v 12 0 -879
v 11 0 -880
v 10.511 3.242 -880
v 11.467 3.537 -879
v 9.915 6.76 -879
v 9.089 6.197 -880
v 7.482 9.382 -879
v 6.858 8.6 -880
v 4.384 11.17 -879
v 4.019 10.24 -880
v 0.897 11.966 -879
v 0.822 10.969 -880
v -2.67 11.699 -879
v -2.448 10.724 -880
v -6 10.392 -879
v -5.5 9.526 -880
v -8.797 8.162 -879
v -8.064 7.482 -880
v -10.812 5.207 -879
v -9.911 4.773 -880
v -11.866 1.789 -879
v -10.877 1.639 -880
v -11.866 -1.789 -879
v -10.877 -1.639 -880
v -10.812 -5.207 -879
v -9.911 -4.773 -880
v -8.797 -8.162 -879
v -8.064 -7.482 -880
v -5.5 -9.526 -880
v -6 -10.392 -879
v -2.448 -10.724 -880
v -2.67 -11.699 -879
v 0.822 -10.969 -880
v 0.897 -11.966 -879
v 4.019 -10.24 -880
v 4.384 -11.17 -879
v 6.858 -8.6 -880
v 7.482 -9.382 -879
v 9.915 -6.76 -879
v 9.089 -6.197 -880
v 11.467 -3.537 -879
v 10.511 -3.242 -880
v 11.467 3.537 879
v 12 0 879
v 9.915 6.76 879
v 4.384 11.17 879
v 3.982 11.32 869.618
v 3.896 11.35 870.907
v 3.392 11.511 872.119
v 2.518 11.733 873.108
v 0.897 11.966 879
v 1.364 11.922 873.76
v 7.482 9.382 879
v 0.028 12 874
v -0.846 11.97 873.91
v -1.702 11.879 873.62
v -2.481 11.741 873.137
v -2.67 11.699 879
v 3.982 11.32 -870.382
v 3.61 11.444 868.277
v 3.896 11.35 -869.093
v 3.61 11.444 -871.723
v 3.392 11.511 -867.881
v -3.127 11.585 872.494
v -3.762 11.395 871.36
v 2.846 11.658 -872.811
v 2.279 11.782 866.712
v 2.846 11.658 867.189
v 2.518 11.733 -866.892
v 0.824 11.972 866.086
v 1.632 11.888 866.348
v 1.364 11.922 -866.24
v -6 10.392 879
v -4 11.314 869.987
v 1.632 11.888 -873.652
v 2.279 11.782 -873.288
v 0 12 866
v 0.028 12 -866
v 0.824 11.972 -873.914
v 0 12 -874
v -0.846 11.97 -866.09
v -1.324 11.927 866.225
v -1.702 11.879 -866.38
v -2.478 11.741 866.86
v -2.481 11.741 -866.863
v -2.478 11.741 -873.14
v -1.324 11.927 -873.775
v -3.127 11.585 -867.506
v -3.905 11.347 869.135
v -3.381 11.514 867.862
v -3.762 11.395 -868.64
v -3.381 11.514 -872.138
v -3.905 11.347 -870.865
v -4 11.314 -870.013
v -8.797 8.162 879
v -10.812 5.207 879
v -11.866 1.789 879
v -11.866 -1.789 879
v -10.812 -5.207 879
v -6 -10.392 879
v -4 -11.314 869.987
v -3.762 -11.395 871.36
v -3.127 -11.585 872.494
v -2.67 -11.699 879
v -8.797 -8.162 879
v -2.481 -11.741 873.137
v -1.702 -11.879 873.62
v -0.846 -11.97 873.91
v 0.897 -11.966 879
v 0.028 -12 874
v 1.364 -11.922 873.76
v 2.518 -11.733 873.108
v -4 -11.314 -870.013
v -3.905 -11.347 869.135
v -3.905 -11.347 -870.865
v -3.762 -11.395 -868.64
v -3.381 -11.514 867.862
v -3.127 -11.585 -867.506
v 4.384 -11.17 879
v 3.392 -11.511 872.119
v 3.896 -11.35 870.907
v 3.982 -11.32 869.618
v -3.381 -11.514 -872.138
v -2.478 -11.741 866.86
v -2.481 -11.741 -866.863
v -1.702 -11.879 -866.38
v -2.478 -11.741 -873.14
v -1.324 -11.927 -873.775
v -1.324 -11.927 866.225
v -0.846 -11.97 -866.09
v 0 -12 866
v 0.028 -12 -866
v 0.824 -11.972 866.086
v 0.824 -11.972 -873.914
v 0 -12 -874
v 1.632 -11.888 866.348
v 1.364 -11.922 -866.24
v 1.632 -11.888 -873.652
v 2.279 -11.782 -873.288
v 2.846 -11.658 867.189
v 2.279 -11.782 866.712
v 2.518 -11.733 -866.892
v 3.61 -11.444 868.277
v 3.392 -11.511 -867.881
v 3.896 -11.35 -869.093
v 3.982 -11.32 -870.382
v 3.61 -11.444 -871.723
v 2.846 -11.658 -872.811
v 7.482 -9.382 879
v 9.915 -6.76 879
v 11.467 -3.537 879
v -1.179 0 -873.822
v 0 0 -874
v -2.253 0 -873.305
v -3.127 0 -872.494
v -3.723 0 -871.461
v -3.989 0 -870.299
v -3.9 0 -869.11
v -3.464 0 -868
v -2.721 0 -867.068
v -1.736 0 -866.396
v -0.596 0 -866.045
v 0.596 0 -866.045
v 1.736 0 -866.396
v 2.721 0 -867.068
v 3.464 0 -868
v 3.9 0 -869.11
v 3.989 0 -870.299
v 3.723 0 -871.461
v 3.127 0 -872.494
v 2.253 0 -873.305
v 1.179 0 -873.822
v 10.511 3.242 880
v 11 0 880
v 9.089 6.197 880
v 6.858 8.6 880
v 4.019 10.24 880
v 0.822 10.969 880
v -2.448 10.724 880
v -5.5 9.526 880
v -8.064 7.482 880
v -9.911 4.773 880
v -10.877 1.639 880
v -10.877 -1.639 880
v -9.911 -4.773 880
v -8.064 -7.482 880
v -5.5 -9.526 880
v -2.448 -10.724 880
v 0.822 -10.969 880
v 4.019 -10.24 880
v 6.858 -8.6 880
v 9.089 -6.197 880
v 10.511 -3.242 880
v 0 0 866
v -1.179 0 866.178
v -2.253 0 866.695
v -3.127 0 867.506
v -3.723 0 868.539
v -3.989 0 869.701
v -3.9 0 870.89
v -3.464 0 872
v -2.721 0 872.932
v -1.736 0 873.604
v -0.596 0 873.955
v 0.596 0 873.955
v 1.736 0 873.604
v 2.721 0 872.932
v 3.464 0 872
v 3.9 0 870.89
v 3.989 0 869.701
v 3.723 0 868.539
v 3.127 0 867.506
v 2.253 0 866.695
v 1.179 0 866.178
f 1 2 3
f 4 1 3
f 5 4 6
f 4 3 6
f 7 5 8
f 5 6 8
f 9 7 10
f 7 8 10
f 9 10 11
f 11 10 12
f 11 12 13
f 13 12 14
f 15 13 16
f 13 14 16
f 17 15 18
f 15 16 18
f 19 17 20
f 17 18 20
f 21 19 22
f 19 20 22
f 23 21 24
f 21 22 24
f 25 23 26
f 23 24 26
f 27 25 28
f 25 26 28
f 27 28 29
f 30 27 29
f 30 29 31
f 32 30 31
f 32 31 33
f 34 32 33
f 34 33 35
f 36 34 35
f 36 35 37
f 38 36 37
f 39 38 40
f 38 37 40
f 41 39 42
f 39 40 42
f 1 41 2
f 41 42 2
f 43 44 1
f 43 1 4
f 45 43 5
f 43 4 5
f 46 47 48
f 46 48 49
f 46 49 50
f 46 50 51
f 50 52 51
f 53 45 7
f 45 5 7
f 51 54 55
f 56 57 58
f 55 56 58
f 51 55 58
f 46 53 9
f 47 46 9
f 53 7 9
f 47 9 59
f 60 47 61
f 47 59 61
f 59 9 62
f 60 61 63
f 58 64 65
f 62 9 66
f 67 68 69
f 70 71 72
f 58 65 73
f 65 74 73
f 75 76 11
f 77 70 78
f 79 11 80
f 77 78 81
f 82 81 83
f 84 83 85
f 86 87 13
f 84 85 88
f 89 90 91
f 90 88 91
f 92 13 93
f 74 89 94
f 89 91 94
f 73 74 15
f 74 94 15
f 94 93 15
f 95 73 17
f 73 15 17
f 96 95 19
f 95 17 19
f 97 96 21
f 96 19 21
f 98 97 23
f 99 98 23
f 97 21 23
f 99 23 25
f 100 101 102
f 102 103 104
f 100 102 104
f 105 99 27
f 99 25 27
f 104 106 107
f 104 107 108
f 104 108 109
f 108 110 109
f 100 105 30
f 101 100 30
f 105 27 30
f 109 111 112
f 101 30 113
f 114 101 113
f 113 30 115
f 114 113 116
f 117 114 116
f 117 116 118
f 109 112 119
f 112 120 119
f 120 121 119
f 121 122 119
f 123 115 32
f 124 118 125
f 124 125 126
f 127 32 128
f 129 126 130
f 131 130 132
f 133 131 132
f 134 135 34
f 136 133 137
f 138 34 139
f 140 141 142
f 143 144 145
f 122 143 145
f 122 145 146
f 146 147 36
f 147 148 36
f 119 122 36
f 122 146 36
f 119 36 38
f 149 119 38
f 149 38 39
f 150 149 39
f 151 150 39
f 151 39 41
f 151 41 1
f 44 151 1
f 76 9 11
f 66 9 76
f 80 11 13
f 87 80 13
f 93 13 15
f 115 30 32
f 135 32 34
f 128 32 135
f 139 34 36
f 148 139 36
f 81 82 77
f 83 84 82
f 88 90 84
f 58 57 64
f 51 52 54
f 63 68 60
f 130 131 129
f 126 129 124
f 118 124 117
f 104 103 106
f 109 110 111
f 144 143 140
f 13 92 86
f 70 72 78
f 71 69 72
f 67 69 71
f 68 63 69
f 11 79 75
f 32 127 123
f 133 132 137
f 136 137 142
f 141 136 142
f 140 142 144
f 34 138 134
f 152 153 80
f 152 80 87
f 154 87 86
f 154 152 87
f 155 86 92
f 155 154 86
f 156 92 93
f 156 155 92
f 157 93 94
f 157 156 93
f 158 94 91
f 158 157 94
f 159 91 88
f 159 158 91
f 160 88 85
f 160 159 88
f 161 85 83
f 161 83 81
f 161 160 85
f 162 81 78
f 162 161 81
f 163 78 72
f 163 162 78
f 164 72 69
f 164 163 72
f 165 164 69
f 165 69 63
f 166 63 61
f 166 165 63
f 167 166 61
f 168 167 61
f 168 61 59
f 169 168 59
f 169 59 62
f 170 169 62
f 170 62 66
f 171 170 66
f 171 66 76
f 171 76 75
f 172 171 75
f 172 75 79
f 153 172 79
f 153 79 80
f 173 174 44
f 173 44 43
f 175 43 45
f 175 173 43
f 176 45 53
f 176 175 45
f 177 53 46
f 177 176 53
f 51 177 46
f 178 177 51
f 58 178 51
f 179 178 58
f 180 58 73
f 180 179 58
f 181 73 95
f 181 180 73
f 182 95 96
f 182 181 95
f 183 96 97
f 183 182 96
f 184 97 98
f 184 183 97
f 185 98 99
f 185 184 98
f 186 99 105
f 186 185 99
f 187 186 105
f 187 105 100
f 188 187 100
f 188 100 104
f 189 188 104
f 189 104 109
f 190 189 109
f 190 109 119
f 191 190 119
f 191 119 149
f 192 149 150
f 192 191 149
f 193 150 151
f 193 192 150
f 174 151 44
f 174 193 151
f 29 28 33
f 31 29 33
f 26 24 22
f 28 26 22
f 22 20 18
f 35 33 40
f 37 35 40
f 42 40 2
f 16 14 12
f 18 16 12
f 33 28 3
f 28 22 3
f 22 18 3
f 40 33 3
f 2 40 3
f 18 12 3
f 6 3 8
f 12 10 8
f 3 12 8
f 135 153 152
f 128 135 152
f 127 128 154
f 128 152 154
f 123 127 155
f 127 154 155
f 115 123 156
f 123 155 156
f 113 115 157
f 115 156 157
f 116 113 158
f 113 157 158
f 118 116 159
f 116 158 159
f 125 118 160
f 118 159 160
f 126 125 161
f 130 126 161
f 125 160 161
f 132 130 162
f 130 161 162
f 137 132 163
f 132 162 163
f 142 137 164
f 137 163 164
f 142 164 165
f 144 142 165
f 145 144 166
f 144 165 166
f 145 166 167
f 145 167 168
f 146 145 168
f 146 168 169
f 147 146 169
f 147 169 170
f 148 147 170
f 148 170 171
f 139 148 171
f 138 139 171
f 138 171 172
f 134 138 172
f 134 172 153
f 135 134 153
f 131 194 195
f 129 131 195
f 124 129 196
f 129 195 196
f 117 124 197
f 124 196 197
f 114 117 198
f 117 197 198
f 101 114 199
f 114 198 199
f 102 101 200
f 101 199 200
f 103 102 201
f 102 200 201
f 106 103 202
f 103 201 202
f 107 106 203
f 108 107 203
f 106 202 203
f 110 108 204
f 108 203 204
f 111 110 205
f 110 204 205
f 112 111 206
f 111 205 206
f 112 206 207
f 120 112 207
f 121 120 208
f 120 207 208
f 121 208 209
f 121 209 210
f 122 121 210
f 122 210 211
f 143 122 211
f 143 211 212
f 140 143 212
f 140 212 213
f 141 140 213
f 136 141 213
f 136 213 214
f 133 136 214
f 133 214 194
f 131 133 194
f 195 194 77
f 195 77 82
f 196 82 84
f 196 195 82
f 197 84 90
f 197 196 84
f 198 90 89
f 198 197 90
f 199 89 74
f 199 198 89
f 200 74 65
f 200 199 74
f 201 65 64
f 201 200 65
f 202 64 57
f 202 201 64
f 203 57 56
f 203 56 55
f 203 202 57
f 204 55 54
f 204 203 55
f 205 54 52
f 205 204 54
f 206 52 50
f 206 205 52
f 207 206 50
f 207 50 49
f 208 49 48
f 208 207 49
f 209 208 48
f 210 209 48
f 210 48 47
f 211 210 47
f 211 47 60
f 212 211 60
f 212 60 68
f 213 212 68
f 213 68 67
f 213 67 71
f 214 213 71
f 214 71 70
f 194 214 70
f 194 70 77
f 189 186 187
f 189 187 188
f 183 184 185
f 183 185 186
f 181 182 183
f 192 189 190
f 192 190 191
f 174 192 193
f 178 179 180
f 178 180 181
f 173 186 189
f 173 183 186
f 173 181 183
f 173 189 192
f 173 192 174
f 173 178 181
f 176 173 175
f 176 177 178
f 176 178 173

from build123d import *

# Parameters (mm, degrees)
DODANIE_WYCI_GNI_CIE1_DEPTH                 = 880
DODANIE_WYCI_GNI_CIE1_DEPTH_BACK            = 880
SZKIC1_R                                    = 12
WYTNIJ_WYCI_GNI_CIE1_REACH                  = 882.164
WYTNIJ_WYCI_GNI_CIE1_END_RADIUS             = 12
SZKIC2_R                                    = 4
WYTNIJ_WYCI_GNI_CIE1_DIRECTION_2_REACH      = 882.164
WYTNIJ_WYCI_GNI_CIE1_DIRECTION_2_END_RADIUS = 12
SFAZOWANIE1_SIZE                            = 1


with BuildPart() as part:
    # Szkic1 → Dodanie-wyciągnięcie1 (new, two sides: drawn at the far end of the back side and taken through both)
    with BuildSketch(Plane.XY.offset(-DODANIE_WYCI_GNI_CIE1_DEPTH_BACK)):
        Circle(SZKIC1_R)
    extrude(amount=DODANIE_WYCI_GNI_CIE1_DEPTH + DODANIE_WYCI_GNI_CIE1_DEPTH_BACK)

    # Wytnij-wyciągnięcie1: up to this cylinder (the profile starts inside it)
    wytnij_wyci_gni_cie1_end = Plane(origin=(0, 0, 0), z_dir=(0, 0, 1)) * Cylinder(WYTNIJ_WYCI_GNI_CIE1_END_RADIUS, 3529.328, mode=Mode.PRIVATE)
    # Szkic2 → Wytnij-wyciągnięcie1 (cut, up to the surface)
    with BuildSketch(Plane(origin=(0, 0, 0), x_dir=(1, 0, 0), z_dir=(0, 1, 0)), mode=Mode.PRIVATE) as wytnij_wyci_gni_cie1_sk1:
        with Locations(Location((0, 870, 0), (0, 0, 90))):
            Circle(SZKIC2_R)
    wytnij_wyci_gni_cie1_tool1 = extrude(wytnij_wyci_gni_cie1_sk1.sketch, amount=-WYTNIJ_WYCI_GNI_CIE1_REACH, mode=Mode.PRIVATE) & wytnij_wyci_gni_cie1_end
    add(wytnij_wyci_gni_cie1_tool1.solids().sort_by_distance((0, 0, -870))[0], mode=Mode.SUBTRACT)
    # Szkic2 → Wytnij-wyciągnięcie1 (cut, up to the surface)
    with BuildSketch(Plane(origin=(0, 0, 0), x_dir=(1, 0, 0), z_dir=(0, 1, 0)), mode=Mode.PRIVATE) as wytnij_wyci_gni_cie1_sk2:
        with Locations(Location((0, -870, 0), (0, 0, 90))):
            Circle(SZKIC2_R)
    wytnij_wyci_gni_cie1_tool2 = extrude(wytnij_wyci_gni_cie1_sk2.sketch, amount=-WYTNIJ_WYCI_GNI_CIE1_REACH, mode=Mode.PRIVATE) & wytnij_wyci_gni_cie1_end
    add(wytnij_wyci_gni_cie1_tool2.solids().sort_by_distance((0, 0, 870))[0], mode=Mode.SUBTRACT)

    # Wytnij-wyciągnięcie1 direction 2: up to this cylinder (the profile starts inside it)
    wytnij_wyci_gni_cie1_direction_2_end = Plane(origin=(0, 0, 0), z_dir=(0, 0, 1)) * Cylinder(WYTNIJ_WYCI_GNI_CIE1_DIRECTION_2_END_RADIUS, 3529.328, mode=Mode.PRIVATE)
    # Szkic2 → Wytnij-wyciągnięcie1 direction 2 (cut, up to the surface)
    with BuildSketch(Plane(origin=(0, 0, 0), x_dir=(1, 0, 0), z_dir=(0, 1, 0)), mode=Mode.PRIVATE) as wytnij_wyci_gni_cie1_direction_2_sk1:
        with Locations(Location((0, 870, 0), (0, 0, 90))):
            Circle(SZKIC2_R)
    wytnij_wyci_gni_cie1_direction_2_tool1 = extrude(wytnij_wyci_gni_cie1_direction_2_sk1.sketch, amount=WYTNIJ_WYCI_GNI_CIE1_DIRECTION_2_REACH, mode=Mode.PRIVATE) & wytnij_wyci_gni_cie1_direction_2_end
    add(wytnij_wyci_gni_cie1_direction_2_tool1.solids().sort_by_distance((0, 0, -870))[0], mode=Mode.SUBTRACT)
    # Szkic2 → Wytnij-wyciągnięcie1 direction 2 (cut, up to the surface)
    with BuildSketch(Plane(origin=(0, 0, 0), x_dir=(1, 0, 0), z_dir=(0, 1, 0)), mode=Mode.PRIVATE) as wytnij_wyci_gni_cie1_direction_2_sk2:
        with Locations(Location((0, -870, 0), (0, 0, 90))):
            Circle(SZKIC2_R)
    wytnij_wyci_gni_cie1_direction_2_tool2 = extrude(wytnij_wyci_gni_cie1_direction_2_sk2.sketch, amount=WYTNIJ_WYCI_GNI_CIE1_DIRECTION_2_REACH, mode=Mode.PRIVATE) & wytnij_wyci_gni_cie1_direction_2_end
    add(wytnij_wyci_gni_cie1_direction_2_tool2.solids().sort_by_distance((0, 0, 870))[0], mode=Mode.SUBTRACT)

    # Sfazowanie1
    sfazowanie1_edges = [part.edges().sort_by_distance(p)[0] for p in [
        (-12, 0, -880),
        (-12, 0, 880),
    ]]
    chamfer(sfazowanie1_edges, length=SFAZOWANIE1_SIZE)


solid = part.part
